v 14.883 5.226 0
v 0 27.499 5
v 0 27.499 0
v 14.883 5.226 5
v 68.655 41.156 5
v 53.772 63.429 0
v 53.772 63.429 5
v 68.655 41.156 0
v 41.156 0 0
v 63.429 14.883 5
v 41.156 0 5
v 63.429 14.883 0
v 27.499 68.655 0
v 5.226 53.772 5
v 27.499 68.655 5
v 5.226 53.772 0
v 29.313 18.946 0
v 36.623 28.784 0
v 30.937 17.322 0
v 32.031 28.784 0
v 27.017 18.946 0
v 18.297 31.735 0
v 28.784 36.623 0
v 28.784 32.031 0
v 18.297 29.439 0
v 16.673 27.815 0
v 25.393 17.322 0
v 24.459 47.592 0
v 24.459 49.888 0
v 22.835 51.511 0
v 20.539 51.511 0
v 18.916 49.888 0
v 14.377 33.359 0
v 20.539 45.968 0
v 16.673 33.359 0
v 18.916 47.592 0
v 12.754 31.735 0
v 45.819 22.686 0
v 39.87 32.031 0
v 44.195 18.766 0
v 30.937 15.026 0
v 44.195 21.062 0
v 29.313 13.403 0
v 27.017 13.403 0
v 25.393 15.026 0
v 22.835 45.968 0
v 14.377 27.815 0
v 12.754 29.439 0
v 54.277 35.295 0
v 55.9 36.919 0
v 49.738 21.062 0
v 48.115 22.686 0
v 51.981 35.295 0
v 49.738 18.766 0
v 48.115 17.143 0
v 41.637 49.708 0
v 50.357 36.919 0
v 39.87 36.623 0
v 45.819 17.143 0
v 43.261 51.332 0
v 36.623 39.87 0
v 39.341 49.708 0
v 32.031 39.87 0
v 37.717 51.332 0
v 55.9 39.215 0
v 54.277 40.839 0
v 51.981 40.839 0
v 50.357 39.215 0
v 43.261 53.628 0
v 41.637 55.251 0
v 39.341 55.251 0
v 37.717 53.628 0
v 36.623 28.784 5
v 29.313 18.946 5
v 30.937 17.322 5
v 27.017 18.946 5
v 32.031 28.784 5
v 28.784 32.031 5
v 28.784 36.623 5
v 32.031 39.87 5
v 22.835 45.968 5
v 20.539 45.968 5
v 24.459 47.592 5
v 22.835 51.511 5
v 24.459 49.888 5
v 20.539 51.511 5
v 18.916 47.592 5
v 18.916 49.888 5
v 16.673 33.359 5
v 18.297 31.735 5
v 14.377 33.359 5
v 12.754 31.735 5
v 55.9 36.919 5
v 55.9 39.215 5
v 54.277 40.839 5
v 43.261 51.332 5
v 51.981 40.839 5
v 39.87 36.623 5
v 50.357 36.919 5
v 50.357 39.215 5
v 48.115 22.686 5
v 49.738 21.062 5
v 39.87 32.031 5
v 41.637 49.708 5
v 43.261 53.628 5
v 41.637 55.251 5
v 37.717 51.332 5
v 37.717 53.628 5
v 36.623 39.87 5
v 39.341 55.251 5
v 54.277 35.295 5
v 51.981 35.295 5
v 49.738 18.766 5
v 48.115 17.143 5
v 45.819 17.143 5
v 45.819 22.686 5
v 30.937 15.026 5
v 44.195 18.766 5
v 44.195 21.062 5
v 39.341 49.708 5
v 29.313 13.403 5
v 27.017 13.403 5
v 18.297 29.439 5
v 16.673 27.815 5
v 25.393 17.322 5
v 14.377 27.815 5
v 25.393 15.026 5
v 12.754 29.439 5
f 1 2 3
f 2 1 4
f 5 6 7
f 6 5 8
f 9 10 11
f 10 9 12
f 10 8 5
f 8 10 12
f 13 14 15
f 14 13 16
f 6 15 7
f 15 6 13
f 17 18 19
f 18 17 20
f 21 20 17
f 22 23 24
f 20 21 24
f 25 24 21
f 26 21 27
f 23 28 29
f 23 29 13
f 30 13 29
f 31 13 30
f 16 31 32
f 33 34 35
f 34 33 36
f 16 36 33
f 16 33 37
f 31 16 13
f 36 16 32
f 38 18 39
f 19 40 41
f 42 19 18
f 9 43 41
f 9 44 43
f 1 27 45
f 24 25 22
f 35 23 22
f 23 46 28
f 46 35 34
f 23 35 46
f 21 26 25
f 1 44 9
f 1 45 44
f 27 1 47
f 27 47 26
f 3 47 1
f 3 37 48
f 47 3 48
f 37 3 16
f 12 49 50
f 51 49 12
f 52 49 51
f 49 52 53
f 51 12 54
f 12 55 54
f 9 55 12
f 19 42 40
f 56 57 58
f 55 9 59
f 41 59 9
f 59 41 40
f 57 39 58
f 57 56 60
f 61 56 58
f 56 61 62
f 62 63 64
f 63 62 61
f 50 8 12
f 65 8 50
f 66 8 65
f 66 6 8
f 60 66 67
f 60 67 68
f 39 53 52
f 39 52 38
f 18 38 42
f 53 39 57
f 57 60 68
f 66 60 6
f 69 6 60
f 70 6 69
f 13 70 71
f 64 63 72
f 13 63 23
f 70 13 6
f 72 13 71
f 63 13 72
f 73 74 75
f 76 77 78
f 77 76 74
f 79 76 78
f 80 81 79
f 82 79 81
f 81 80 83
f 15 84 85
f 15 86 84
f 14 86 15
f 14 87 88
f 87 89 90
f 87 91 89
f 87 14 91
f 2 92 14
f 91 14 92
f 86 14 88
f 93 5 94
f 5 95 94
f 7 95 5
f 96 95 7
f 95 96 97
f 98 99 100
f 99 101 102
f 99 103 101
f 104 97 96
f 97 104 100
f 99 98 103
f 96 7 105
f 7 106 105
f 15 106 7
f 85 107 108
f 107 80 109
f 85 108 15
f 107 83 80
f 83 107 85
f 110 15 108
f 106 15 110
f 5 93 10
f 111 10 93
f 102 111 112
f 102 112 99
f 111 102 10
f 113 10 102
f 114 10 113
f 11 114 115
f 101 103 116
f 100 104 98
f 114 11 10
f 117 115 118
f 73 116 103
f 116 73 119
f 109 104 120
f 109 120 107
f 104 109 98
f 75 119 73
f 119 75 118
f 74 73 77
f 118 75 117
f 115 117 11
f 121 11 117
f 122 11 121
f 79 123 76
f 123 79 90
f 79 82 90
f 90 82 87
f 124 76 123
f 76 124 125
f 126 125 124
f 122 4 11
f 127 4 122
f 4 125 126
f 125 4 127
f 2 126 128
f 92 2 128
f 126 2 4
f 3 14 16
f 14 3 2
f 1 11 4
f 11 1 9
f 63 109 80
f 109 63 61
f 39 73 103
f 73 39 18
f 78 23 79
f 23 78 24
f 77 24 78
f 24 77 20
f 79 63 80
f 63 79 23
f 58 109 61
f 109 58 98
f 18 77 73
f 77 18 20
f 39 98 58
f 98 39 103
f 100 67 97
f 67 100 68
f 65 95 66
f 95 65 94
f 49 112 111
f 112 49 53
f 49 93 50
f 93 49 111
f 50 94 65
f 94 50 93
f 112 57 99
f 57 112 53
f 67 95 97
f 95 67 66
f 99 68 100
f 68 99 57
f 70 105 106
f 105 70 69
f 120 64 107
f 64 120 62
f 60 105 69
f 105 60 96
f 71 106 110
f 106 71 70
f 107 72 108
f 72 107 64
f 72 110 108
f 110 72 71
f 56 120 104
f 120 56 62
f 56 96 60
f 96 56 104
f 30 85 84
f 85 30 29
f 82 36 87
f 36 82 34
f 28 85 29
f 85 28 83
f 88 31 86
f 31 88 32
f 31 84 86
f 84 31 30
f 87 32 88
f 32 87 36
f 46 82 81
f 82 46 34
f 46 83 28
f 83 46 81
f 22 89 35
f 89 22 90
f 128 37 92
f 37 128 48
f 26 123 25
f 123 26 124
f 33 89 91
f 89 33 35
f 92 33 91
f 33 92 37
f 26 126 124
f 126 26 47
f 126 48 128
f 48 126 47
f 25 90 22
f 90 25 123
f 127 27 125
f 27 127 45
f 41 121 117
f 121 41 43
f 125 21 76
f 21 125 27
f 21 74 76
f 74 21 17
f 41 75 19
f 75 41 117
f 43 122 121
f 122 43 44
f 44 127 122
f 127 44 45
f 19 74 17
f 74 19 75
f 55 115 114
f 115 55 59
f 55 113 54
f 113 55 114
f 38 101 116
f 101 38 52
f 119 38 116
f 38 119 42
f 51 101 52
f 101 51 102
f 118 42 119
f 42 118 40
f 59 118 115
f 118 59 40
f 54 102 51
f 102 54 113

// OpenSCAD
$fn = 32;

// ----------------------------------------------------------------------
// Polygon plate: 8-gon R35, 6 bolt windows
// ----------------------------------------------------------------------

// --- parameters (mm) ---
sides = 8;                // number of polygon sides
plate_r = 35;             // circumscribed radius of the polygon
bore_r = 6;               // centre bore radius
bolts = 6;                // number of bolt windows
ring_r = 19.17;           // bolt-circle radius
bolt_r = 3;               // bolt window radius
plate_t = 5;              // plate thickness, Z (extrusion height)

plate_d = 2 * plate_r;  // circumscribed diameter
bore_d = 2 * bore_r;  // centre bore diameter
bolt_d = 2 * bolt_r;  // bolt window diameter
ring_d = 2 * ring_r;  // bolt-circle diameter

profile = [[68.655, 41.156], [53.772, 63.429], [27.499, 68.655], [5.226, 53.772], [0, 27.499], [14.883, 5.226], [41.156, 0], [63.429, 14.883]];  // primary outline, 8 points, counter clockwise
void_1 = [[39.87, 36.623], [36.623, 39.87], [32.031, 39.87], [28.784, 36.623], [28.784, 32.031], [32.031, 28.784], [36.623, 28.784], [39.87, 32.031]];  // centre bore, 8 points
void_2 = [[55.9, 39.215], [54.277, 40.839], [51.981, 40.839], [50.357, 39.215], [50.357, 36.919], [51.981, 35.295], [54.277, 35.295], [55.9, 36.919]];  // bolt window 1, 8 points
void_3 = [[43.261, 53.628], [41.637, 55.251], [39.341, 55.251], [37.717, 53.628], [37.717, 51.332], [39.341, 49.708], [41.637, 49.708], [43.261, 51.332]];  // bolt window 2, 8 points
void_4 = [[24.459, 49.888], [22.835, 51.511], [20.539, 51.511], [18.916, 49.888], [18.916, 47.592], [20.539, 45.968], [22.835, 45.968], [24.459, 47.592]];  // bolt window 3, 8 points
void_5 = [[18.297, 31.735], [16.673, 33.359], [14.377, 33.359], [12.754, 31.735], [12.754, 29.439], [14.377, 27.815], [16.673, 27.815], [18.297, 29.439]];  // bolt window 4, 8 points
void_6 = [[30.937, 17.322], [29.313, 18.946], [27.017, 18.946], [25.393, 17.322], [25.393, 15.026], [27.017, 13.403], [29.313, 13.403], [30.937, 15.026]];  // bolt window 5, 8 points
void_7 = [[49.738, 21.062], [48.115, 22.686], [45.819, 22.686], [44.195, 21.062], [44.195, 18.766], [45.819, 17.143], [48.115, 17.143], [49.738, 18.766]];  // bolt window 6, 8 points

// --- the one profile operation ---
difference() {
  linear_extrude(height = plate_t) polygon(points = profile);
  translate([0, 0, -1])
    linear_extrude(height = plate_t + 2) polygon(points = void_1);
  translate([0, 0, -1])
    linear_extrude(height = plate_t + 2) polygon(points = void_2);
  translate([0, 0, -1])
    linear_extrude(height = plate_t + 2) polygon(points = void_3);
  translate([0, 0, -1])
    linear_extrude(height = plate_t + 2) polygon(points = void_4);
  translate([0, 0, -1])
    linear_extrude(height = plate_t + 2) polygon(points = void_5);
  translate([0, 0, -1])
    linear_extrude(height = plate_t + 2) polygon(points = void_6);
  translate([0, 0, -1])
    linear_extrude(height = plate_t + 2) polygon(points = void_7);
}
